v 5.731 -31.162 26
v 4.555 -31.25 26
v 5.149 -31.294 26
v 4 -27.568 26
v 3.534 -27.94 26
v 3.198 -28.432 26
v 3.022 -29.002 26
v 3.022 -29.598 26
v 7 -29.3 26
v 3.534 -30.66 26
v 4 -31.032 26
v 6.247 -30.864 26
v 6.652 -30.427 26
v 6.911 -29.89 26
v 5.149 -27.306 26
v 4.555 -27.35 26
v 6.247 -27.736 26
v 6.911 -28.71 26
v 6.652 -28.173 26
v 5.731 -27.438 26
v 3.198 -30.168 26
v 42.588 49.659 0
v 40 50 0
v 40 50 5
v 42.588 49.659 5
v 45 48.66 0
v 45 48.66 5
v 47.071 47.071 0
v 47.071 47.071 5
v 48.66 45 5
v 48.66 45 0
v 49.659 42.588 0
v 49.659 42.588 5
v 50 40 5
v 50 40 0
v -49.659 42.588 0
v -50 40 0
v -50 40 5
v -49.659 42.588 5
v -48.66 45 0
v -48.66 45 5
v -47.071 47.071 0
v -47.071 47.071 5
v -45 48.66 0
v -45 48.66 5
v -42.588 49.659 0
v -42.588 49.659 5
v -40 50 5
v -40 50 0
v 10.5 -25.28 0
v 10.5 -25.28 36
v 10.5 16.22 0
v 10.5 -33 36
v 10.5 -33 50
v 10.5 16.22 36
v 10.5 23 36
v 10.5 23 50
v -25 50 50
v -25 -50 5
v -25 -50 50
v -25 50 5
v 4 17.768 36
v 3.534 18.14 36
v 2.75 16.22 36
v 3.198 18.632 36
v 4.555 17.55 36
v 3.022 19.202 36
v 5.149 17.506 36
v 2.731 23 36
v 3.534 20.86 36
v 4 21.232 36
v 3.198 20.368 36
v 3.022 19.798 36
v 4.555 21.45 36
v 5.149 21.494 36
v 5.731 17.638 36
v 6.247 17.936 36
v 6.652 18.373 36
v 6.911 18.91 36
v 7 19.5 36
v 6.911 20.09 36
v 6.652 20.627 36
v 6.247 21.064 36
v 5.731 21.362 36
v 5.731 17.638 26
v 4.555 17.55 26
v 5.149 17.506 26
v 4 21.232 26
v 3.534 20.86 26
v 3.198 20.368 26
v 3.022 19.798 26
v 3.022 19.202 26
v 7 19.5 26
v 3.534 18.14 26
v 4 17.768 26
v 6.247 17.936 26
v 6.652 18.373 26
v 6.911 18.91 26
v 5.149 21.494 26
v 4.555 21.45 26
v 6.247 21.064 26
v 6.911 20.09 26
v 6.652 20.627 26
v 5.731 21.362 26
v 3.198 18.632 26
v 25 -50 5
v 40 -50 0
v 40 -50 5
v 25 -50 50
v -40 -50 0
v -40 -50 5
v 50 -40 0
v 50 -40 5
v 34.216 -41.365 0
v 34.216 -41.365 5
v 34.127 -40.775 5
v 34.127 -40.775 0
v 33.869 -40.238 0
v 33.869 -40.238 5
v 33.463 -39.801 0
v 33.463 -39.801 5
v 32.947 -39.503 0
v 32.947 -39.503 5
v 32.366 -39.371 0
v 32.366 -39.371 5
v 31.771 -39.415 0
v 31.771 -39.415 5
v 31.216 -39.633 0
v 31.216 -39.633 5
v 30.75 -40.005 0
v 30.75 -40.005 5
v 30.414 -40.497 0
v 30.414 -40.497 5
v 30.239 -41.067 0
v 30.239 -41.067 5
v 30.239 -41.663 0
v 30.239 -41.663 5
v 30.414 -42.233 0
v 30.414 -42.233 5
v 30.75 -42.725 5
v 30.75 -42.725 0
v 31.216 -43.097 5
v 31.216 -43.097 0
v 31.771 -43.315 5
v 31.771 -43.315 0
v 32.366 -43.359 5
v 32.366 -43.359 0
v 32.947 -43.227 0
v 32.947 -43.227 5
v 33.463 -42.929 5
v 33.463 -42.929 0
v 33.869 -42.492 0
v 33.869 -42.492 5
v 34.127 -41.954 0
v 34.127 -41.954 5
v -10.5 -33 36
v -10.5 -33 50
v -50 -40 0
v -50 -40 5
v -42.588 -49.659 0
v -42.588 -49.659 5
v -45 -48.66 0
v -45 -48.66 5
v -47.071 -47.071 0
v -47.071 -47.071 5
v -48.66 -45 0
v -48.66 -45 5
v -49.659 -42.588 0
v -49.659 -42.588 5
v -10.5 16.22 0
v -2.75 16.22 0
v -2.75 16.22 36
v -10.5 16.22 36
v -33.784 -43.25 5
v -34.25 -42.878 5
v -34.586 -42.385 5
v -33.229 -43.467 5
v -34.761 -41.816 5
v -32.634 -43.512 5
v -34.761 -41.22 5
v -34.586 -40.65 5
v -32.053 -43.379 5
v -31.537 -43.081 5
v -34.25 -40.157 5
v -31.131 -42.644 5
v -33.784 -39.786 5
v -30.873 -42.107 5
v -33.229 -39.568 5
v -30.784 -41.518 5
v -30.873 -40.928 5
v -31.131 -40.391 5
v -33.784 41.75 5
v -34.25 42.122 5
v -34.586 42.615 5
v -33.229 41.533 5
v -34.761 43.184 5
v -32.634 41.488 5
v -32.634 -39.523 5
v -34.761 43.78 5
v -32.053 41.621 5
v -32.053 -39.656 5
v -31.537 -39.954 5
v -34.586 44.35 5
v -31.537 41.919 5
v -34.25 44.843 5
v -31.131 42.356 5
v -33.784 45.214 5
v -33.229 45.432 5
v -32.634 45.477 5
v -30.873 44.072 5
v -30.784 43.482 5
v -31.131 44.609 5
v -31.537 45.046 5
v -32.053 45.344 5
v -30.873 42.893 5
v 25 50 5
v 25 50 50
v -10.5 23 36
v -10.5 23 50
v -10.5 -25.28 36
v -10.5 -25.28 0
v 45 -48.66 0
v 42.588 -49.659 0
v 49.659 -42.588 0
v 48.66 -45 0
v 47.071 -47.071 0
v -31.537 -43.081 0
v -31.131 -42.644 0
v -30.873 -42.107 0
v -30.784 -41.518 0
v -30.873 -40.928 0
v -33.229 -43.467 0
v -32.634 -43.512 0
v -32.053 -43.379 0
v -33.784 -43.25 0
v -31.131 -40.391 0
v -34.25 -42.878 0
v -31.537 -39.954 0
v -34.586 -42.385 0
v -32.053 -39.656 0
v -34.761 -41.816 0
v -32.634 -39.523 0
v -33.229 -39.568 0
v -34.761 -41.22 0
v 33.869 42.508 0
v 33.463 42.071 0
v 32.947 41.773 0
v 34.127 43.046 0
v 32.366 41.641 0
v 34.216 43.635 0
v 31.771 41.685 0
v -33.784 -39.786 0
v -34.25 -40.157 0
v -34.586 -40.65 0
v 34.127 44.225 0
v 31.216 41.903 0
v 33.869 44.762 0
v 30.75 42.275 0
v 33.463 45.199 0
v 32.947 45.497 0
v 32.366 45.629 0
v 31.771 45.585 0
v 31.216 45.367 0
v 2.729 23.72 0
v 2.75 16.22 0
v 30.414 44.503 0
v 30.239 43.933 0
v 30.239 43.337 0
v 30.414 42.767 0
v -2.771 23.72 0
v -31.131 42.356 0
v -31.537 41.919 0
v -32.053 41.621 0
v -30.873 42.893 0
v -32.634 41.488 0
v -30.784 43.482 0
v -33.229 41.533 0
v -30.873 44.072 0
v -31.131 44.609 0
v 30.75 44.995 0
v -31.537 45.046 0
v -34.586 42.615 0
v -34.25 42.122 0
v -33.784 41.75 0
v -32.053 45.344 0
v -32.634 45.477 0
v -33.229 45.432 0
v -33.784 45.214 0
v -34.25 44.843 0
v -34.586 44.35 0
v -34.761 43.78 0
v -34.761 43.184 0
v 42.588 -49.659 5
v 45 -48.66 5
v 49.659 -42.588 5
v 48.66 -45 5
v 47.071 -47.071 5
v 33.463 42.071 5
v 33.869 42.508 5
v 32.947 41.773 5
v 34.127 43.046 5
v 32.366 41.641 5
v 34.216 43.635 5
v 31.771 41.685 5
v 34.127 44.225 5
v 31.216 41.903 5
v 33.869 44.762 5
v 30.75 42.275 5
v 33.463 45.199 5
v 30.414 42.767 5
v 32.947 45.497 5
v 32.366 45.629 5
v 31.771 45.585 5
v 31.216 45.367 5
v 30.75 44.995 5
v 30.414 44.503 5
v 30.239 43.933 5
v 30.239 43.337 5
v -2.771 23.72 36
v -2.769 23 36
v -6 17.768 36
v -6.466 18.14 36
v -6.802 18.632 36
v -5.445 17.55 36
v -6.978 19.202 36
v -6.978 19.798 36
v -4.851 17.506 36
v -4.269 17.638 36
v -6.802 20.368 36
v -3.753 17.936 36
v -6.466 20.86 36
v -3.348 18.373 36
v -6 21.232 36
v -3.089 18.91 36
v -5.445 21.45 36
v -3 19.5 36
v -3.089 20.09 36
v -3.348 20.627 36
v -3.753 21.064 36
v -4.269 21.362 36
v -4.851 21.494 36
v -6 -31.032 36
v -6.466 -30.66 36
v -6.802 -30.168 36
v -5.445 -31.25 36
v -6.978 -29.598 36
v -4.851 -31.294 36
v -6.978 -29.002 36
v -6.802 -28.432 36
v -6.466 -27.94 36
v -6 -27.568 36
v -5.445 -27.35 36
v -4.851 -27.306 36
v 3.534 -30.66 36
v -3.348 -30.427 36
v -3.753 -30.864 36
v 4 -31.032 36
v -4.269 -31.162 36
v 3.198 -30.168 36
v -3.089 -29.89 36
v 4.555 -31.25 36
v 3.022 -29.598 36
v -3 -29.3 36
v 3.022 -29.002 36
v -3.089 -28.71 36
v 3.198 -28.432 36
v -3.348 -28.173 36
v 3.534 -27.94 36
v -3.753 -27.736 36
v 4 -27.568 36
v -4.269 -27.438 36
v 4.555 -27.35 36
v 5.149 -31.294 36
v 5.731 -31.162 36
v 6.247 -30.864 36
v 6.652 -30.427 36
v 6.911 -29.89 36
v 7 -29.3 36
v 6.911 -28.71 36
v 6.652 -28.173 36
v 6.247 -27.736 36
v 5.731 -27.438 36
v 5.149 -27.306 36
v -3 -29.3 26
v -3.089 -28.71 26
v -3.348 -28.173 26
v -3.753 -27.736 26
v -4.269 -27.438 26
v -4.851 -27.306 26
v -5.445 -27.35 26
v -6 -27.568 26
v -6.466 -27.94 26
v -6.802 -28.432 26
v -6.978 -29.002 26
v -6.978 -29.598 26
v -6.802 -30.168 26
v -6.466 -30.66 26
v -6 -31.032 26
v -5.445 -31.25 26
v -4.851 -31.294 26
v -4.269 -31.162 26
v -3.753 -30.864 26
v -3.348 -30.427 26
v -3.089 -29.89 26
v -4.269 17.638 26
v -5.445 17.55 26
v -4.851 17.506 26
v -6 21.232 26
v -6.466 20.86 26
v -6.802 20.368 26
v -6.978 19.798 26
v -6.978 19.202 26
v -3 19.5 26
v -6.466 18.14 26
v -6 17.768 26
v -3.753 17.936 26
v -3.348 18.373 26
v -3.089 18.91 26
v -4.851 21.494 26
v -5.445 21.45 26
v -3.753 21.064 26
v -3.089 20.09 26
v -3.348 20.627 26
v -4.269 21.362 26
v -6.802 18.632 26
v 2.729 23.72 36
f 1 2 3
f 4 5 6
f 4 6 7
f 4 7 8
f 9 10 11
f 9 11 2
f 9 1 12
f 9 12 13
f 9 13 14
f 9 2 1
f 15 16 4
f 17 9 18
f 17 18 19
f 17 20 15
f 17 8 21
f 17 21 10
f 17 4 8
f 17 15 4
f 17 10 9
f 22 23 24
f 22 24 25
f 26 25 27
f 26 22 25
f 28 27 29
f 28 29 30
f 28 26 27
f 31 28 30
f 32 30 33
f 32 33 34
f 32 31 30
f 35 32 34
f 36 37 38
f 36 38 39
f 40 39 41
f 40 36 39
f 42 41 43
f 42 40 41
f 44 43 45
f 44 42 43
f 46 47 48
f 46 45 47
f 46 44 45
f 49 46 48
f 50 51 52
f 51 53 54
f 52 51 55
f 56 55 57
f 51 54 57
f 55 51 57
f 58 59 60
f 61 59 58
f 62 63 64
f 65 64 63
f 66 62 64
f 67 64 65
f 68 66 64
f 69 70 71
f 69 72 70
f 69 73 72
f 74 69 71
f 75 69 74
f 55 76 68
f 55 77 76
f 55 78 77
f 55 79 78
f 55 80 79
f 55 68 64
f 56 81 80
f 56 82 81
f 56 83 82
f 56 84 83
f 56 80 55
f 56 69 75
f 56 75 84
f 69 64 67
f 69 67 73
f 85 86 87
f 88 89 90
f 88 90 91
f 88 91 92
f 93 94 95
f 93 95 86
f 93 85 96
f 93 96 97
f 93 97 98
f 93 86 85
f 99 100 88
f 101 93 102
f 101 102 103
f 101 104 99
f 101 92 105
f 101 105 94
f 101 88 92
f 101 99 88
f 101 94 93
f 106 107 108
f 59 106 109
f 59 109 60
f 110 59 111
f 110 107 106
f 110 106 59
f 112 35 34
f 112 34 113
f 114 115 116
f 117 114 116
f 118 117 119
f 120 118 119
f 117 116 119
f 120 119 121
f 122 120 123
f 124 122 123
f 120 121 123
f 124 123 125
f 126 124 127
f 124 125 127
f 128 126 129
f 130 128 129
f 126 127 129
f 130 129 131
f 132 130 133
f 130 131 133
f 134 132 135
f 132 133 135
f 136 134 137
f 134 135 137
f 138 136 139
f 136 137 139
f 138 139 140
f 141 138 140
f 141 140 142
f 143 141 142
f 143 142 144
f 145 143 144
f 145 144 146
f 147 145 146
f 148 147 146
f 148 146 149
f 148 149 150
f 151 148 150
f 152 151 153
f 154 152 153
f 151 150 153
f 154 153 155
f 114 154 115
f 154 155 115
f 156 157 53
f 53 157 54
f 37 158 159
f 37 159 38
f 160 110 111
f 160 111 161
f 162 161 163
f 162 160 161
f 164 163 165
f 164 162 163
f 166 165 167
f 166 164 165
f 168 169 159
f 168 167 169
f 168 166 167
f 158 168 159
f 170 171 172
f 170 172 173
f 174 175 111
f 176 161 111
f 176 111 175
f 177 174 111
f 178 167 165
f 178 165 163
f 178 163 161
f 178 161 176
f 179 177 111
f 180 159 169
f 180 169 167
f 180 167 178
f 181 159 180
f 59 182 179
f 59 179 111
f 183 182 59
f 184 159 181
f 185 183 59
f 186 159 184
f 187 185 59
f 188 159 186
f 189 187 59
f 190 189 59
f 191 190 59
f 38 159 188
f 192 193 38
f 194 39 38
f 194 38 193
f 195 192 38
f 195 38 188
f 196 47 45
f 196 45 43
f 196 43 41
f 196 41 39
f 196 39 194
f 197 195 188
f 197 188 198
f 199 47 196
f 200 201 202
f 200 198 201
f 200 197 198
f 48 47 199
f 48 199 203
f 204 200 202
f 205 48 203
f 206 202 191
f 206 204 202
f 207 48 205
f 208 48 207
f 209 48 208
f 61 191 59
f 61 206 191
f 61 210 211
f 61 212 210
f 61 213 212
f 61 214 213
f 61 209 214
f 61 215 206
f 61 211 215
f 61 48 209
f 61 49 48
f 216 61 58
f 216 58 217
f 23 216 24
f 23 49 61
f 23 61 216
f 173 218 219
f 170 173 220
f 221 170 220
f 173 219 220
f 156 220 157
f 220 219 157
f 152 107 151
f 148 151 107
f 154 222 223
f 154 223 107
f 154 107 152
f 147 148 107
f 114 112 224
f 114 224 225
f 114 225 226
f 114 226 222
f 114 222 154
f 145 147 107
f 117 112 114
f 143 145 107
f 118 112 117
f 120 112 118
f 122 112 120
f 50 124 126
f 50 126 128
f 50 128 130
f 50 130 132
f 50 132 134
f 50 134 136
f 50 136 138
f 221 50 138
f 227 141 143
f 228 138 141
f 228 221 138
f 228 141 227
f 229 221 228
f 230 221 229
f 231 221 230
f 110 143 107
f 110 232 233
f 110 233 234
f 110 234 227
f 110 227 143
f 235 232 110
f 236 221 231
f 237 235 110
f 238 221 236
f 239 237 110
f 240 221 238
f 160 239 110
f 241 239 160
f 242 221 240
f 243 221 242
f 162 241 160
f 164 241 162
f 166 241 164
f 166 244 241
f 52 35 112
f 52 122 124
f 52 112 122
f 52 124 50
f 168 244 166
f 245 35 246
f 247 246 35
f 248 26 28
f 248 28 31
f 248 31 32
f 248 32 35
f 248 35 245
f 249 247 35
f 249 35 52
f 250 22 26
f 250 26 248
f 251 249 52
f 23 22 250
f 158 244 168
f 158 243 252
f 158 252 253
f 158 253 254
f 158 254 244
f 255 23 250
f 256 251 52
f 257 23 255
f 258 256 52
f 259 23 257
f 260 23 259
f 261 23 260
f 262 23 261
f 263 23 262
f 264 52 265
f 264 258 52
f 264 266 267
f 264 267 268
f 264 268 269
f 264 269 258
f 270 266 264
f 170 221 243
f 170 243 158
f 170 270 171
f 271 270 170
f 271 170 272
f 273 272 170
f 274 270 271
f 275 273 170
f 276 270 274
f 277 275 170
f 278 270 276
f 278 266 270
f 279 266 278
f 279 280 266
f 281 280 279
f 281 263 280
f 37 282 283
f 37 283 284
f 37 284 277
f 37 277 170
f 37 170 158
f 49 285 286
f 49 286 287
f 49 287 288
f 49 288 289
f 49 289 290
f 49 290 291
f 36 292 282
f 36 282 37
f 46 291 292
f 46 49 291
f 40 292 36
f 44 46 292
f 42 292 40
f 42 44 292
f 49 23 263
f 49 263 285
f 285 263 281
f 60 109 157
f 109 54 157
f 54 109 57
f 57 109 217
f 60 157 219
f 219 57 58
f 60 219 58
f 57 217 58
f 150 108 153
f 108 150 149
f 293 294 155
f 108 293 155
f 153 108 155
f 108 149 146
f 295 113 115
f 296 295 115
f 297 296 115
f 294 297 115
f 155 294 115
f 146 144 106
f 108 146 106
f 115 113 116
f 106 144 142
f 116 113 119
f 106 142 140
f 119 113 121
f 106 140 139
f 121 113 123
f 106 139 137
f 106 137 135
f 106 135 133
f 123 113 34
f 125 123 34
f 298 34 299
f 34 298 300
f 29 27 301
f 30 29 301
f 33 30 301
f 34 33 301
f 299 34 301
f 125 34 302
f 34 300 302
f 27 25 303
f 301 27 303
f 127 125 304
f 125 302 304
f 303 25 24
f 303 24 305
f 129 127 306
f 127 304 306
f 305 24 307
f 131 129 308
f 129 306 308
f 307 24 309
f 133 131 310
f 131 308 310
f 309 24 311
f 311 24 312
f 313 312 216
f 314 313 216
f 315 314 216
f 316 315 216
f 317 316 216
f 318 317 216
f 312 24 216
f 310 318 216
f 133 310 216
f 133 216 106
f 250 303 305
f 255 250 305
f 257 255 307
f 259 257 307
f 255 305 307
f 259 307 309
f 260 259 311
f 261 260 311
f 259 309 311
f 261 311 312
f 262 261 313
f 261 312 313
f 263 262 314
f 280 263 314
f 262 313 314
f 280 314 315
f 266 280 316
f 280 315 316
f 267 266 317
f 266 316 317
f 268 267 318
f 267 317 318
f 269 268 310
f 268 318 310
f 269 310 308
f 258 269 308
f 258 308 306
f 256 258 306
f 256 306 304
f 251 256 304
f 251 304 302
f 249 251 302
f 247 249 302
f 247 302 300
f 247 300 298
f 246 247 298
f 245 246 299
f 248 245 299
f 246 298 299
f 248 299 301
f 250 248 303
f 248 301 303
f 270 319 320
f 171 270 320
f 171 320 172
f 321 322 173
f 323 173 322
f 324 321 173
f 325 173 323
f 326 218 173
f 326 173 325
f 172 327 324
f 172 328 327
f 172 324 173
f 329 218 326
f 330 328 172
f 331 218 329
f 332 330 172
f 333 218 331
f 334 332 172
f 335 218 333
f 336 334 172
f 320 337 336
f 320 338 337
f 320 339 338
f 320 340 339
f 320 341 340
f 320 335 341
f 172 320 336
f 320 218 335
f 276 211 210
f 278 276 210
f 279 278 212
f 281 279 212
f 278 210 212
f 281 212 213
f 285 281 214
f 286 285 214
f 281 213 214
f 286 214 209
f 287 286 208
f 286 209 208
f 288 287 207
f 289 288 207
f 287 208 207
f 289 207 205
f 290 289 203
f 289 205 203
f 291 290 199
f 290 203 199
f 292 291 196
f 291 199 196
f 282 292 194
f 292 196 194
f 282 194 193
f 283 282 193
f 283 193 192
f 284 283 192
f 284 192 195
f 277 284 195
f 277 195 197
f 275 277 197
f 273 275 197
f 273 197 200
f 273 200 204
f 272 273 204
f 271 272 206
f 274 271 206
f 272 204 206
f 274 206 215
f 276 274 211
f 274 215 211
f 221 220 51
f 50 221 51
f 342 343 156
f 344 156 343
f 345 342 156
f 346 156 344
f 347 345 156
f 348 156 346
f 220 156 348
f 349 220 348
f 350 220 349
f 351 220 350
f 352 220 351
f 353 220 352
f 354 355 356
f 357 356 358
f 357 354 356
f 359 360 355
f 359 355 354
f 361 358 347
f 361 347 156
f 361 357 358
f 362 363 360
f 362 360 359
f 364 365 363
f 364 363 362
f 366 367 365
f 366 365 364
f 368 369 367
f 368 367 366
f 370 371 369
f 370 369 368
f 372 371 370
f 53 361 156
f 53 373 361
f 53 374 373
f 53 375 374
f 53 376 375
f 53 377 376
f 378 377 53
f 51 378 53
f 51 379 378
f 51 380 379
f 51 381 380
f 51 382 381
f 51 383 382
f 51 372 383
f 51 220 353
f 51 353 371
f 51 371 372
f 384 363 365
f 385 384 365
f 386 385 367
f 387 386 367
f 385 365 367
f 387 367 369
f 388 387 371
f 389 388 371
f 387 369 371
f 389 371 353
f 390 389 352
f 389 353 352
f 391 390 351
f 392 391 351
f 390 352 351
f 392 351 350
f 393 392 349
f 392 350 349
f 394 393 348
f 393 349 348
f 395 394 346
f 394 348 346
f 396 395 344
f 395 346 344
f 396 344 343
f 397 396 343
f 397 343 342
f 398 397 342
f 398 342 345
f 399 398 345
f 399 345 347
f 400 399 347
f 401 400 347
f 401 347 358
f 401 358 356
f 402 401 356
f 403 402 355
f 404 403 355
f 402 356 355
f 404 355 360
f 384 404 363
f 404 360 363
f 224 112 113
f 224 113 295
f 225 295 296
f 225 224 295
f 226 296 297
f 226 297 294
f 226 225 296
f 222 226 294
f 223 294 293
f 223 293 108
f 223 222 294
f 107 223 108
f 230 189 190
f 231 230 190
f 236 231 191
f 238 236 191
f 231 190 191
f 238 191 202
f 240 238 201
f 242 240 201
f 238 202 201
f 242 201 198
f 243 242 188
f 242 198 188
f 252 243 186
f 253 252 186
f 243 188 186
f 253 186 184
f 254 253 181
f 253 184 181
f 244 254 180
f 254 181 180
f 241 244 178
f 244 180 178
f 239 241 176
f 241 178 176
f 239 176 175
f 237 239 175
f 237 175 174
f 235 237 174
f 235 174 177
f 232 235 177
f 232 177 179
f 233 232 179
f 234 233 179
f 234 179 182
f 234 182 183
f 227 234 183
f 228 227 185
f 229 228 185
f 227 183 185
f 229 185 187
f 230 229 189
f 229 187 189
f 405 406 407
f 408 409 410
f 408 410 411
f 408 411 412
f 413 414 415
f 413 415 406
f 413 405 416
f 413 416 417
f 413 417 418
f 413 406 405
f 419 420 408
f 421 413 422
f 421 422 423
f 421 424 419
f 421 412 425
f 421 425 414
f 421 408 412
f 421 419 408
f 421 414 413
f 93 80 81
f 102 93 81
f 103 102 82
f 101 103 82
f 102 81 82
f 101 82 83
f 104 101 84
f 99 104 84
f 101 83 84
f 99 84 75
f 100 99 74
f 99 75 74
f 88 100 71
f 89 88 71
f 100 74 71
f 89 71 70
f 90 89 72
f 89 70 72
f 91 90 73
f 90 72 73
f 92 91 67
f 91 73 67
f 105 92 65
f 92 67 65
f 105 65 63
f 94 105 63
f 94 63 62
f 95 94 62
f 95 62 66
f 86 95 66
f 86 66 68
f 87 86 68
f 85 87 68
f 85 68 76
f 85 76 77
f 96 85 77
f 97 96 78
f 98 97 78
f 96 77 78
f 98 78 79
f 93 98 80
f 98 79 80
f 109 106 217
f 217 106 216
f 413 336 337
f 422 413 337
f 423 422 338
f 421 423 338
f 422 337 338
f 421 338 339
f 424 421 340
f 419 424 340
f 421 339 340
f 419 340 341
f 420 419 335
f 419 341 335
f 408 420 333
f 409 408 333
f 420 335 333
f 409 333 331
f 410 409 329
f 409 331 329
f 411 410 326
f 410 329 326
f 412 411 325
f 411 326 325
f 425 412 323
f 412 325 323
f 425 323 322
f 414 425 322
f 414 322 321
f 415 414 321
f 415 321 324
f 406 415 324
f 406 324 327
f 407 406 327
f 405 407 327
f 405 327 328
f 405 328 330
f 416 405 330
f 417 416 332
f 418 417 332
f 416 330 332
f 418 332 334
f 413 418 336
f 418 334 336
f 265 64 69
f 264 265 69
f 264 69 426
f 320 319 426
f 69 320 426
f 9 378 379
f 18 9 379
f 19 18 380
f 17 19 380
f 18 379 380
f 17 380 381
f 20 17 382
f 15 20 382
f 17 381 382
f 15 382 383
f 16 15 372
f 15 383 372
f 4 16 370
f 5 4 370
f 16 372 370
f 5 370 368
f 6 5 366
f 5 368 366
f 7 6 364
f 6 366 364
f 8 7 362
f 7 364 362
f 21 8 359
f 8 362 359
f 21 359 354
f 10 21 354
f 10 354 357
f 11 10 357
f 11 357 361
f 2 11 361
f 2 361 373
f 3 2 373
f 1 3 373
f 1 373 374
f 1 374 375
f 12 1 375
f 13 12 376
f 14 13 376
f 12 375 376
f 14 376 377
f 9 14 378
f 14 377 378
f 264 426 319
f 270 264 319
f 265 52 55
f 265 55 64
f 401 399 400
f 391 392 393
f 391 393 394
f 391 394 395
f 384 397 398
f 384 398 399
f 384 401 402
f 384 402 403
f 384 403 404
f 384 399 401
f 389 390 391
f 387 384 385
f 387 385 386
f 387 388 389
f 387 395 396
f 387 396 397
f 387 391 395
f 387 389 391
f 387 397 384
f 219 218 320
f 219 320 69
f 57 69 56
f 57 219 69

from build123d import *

# Parameters (mm, degrees)
BOSS_EXTRUDE1_DEPTH = 50
SKETCH2_W           = 21
SKETCH2_H           = 56
CUT_EXTRUDE1_DEPTH  = 14
CUT_EXTRUDE2_DEPTH  = 40
CUT_EXTRUDE3_START  = -45
CUT_EXTRUDE3_DEPTH  = 45
SKETCH5_R           = 2
CUT_EXTRUDE4_DEPTH  = 10
SKETCH6_R           = 2
CUT_EXTRUDE5_DEPTH  = 5


with BuildPart() as part:
    # Sketch1 → Boss-Extrude1 (new body)
    with BuildSketch(Plane.XY):
        with BuildLine():
            Line((-40, 50), (40, 50))
            ThreePointArc((40, 50), (47.071067812, 47.071067812), (50, 40))
            Line((50, 40), (50, -40))
            ThreePointArc((50, -40), (47.071067812, -47.071067812), (40, -50))
            Line((40, -50), (-40, -50))
            ThreePointArc((-40, -50), (-47.071067812, -47.071067812), (-50, -40))
            Line((-50, -40), (-50, 40))
            ThreePointArc((-50, 40), (-47.071067812, 47.071067812), (-40, 50))
        make_face()
    extrude(amount=BOSS_EXTRUDE1_DEPTH)

    # Sketch2 → Cut-Extrude1 (cut)
    with BuildSketch(Plane.XY.offset(50)):
        with Locations((0, -5)):
            Rectangle(SKETCH2_W, SKETCH2_H)
    extrude(amount=-CUT_EXTRUDE1_DEPTH, mode=Mode.SUBTRACT)

    # Sketch3 → Cut-Extrude2 (cut)
    with BuildSketch(Plane.XY.offset(36)):
        Polygon((-10.5, 16.220000255), (-10.5, -25.279999745), (10.5, -25.279999745), (10.5, 16.220000255), (2.75, 16.220000255), (2.728552587, 23.719969589), (-2.771447413, 23.719969589), (-2.75, 16.220000255), align=None)
    extrude(amount=-CUT_EXTRUDE2_DEPTH, mode=Mode.SUBTRACT)

    # Sketch4 → Cut-Extrude3 (cut)
    with BuildSketch(Plane.XY.offset(50).offset(CUT_EXTRUDE3_START)):
        with BuildLine():
            Line((40, -50), (25, -50))
            Line((25, -50), (25, 50))
            Line((25, 50), (40, 50))
            ThreePointArc((40, 50), (47.071067812, 47.071067812), (50, 40))
            Line((50, 40), (50, -40))
            ThreePointArc((50, -40), (47.071067812, -47.071067812), (40, -50))
        make_face()
        with BuildLine():
            Line((-40, -50), (-25, -50))
            Line((-25, -50), (-25, 50))
            Line((-25, 50), (-40, 50))
            ThreePointArc((-40, 50), (-47.071067812, 47.071067812), (-50, 40))
            Line((-50, 40), (-50, -40))
            ThreePointArc((-50, -40), (-47.071067812, -47.071067812), (-40, -50))
        make_face()
    extrude(amount=CUT_EXTRUDE3_DEPTH, mode=Mode.SUBTRACT)

    # Sketch5 → Cut-Extrude4 (cut)
    with BuildSketch(Plane.XY.offset(36)):
        with Locations((-5, 19.5)):
            Circle(SKETCH5_R)
        with Locations((5, 19.5)):
            Circle(SKETCH5_R)
        with Locations((-5, -29.3)):
            Circle(SKETCH5_R)
        with Locations((5, -29.3)):
            Circle(SKETCH5_R)
    extrude(amount=-CUT_EXTRUDE4_DEPTH, mode=Mode.SUBTRACT)

    # Sketch6 → Cut-Extrude5 (cut)
    with BuildSketch(Plane.XY.offset(5)):
        with Locations((-32.783708715, 43.482376607)):
            Circle(SKETCH6_R)
        with Locations((-32.783708715, -41.517623393)):
            Circle(SKETCH6_R)
        with Locations((32.216291285, -41.364915091)):
            Circle(SKETCH6_R)
        with Locations((32.216291285, 43.635084909)):
            Circle(SKETCH6_R)
    extrude(amount=-CUT_EXTRUDE5_DEPTH, mode=Mode.SUBTRACT)


solid = part.part
